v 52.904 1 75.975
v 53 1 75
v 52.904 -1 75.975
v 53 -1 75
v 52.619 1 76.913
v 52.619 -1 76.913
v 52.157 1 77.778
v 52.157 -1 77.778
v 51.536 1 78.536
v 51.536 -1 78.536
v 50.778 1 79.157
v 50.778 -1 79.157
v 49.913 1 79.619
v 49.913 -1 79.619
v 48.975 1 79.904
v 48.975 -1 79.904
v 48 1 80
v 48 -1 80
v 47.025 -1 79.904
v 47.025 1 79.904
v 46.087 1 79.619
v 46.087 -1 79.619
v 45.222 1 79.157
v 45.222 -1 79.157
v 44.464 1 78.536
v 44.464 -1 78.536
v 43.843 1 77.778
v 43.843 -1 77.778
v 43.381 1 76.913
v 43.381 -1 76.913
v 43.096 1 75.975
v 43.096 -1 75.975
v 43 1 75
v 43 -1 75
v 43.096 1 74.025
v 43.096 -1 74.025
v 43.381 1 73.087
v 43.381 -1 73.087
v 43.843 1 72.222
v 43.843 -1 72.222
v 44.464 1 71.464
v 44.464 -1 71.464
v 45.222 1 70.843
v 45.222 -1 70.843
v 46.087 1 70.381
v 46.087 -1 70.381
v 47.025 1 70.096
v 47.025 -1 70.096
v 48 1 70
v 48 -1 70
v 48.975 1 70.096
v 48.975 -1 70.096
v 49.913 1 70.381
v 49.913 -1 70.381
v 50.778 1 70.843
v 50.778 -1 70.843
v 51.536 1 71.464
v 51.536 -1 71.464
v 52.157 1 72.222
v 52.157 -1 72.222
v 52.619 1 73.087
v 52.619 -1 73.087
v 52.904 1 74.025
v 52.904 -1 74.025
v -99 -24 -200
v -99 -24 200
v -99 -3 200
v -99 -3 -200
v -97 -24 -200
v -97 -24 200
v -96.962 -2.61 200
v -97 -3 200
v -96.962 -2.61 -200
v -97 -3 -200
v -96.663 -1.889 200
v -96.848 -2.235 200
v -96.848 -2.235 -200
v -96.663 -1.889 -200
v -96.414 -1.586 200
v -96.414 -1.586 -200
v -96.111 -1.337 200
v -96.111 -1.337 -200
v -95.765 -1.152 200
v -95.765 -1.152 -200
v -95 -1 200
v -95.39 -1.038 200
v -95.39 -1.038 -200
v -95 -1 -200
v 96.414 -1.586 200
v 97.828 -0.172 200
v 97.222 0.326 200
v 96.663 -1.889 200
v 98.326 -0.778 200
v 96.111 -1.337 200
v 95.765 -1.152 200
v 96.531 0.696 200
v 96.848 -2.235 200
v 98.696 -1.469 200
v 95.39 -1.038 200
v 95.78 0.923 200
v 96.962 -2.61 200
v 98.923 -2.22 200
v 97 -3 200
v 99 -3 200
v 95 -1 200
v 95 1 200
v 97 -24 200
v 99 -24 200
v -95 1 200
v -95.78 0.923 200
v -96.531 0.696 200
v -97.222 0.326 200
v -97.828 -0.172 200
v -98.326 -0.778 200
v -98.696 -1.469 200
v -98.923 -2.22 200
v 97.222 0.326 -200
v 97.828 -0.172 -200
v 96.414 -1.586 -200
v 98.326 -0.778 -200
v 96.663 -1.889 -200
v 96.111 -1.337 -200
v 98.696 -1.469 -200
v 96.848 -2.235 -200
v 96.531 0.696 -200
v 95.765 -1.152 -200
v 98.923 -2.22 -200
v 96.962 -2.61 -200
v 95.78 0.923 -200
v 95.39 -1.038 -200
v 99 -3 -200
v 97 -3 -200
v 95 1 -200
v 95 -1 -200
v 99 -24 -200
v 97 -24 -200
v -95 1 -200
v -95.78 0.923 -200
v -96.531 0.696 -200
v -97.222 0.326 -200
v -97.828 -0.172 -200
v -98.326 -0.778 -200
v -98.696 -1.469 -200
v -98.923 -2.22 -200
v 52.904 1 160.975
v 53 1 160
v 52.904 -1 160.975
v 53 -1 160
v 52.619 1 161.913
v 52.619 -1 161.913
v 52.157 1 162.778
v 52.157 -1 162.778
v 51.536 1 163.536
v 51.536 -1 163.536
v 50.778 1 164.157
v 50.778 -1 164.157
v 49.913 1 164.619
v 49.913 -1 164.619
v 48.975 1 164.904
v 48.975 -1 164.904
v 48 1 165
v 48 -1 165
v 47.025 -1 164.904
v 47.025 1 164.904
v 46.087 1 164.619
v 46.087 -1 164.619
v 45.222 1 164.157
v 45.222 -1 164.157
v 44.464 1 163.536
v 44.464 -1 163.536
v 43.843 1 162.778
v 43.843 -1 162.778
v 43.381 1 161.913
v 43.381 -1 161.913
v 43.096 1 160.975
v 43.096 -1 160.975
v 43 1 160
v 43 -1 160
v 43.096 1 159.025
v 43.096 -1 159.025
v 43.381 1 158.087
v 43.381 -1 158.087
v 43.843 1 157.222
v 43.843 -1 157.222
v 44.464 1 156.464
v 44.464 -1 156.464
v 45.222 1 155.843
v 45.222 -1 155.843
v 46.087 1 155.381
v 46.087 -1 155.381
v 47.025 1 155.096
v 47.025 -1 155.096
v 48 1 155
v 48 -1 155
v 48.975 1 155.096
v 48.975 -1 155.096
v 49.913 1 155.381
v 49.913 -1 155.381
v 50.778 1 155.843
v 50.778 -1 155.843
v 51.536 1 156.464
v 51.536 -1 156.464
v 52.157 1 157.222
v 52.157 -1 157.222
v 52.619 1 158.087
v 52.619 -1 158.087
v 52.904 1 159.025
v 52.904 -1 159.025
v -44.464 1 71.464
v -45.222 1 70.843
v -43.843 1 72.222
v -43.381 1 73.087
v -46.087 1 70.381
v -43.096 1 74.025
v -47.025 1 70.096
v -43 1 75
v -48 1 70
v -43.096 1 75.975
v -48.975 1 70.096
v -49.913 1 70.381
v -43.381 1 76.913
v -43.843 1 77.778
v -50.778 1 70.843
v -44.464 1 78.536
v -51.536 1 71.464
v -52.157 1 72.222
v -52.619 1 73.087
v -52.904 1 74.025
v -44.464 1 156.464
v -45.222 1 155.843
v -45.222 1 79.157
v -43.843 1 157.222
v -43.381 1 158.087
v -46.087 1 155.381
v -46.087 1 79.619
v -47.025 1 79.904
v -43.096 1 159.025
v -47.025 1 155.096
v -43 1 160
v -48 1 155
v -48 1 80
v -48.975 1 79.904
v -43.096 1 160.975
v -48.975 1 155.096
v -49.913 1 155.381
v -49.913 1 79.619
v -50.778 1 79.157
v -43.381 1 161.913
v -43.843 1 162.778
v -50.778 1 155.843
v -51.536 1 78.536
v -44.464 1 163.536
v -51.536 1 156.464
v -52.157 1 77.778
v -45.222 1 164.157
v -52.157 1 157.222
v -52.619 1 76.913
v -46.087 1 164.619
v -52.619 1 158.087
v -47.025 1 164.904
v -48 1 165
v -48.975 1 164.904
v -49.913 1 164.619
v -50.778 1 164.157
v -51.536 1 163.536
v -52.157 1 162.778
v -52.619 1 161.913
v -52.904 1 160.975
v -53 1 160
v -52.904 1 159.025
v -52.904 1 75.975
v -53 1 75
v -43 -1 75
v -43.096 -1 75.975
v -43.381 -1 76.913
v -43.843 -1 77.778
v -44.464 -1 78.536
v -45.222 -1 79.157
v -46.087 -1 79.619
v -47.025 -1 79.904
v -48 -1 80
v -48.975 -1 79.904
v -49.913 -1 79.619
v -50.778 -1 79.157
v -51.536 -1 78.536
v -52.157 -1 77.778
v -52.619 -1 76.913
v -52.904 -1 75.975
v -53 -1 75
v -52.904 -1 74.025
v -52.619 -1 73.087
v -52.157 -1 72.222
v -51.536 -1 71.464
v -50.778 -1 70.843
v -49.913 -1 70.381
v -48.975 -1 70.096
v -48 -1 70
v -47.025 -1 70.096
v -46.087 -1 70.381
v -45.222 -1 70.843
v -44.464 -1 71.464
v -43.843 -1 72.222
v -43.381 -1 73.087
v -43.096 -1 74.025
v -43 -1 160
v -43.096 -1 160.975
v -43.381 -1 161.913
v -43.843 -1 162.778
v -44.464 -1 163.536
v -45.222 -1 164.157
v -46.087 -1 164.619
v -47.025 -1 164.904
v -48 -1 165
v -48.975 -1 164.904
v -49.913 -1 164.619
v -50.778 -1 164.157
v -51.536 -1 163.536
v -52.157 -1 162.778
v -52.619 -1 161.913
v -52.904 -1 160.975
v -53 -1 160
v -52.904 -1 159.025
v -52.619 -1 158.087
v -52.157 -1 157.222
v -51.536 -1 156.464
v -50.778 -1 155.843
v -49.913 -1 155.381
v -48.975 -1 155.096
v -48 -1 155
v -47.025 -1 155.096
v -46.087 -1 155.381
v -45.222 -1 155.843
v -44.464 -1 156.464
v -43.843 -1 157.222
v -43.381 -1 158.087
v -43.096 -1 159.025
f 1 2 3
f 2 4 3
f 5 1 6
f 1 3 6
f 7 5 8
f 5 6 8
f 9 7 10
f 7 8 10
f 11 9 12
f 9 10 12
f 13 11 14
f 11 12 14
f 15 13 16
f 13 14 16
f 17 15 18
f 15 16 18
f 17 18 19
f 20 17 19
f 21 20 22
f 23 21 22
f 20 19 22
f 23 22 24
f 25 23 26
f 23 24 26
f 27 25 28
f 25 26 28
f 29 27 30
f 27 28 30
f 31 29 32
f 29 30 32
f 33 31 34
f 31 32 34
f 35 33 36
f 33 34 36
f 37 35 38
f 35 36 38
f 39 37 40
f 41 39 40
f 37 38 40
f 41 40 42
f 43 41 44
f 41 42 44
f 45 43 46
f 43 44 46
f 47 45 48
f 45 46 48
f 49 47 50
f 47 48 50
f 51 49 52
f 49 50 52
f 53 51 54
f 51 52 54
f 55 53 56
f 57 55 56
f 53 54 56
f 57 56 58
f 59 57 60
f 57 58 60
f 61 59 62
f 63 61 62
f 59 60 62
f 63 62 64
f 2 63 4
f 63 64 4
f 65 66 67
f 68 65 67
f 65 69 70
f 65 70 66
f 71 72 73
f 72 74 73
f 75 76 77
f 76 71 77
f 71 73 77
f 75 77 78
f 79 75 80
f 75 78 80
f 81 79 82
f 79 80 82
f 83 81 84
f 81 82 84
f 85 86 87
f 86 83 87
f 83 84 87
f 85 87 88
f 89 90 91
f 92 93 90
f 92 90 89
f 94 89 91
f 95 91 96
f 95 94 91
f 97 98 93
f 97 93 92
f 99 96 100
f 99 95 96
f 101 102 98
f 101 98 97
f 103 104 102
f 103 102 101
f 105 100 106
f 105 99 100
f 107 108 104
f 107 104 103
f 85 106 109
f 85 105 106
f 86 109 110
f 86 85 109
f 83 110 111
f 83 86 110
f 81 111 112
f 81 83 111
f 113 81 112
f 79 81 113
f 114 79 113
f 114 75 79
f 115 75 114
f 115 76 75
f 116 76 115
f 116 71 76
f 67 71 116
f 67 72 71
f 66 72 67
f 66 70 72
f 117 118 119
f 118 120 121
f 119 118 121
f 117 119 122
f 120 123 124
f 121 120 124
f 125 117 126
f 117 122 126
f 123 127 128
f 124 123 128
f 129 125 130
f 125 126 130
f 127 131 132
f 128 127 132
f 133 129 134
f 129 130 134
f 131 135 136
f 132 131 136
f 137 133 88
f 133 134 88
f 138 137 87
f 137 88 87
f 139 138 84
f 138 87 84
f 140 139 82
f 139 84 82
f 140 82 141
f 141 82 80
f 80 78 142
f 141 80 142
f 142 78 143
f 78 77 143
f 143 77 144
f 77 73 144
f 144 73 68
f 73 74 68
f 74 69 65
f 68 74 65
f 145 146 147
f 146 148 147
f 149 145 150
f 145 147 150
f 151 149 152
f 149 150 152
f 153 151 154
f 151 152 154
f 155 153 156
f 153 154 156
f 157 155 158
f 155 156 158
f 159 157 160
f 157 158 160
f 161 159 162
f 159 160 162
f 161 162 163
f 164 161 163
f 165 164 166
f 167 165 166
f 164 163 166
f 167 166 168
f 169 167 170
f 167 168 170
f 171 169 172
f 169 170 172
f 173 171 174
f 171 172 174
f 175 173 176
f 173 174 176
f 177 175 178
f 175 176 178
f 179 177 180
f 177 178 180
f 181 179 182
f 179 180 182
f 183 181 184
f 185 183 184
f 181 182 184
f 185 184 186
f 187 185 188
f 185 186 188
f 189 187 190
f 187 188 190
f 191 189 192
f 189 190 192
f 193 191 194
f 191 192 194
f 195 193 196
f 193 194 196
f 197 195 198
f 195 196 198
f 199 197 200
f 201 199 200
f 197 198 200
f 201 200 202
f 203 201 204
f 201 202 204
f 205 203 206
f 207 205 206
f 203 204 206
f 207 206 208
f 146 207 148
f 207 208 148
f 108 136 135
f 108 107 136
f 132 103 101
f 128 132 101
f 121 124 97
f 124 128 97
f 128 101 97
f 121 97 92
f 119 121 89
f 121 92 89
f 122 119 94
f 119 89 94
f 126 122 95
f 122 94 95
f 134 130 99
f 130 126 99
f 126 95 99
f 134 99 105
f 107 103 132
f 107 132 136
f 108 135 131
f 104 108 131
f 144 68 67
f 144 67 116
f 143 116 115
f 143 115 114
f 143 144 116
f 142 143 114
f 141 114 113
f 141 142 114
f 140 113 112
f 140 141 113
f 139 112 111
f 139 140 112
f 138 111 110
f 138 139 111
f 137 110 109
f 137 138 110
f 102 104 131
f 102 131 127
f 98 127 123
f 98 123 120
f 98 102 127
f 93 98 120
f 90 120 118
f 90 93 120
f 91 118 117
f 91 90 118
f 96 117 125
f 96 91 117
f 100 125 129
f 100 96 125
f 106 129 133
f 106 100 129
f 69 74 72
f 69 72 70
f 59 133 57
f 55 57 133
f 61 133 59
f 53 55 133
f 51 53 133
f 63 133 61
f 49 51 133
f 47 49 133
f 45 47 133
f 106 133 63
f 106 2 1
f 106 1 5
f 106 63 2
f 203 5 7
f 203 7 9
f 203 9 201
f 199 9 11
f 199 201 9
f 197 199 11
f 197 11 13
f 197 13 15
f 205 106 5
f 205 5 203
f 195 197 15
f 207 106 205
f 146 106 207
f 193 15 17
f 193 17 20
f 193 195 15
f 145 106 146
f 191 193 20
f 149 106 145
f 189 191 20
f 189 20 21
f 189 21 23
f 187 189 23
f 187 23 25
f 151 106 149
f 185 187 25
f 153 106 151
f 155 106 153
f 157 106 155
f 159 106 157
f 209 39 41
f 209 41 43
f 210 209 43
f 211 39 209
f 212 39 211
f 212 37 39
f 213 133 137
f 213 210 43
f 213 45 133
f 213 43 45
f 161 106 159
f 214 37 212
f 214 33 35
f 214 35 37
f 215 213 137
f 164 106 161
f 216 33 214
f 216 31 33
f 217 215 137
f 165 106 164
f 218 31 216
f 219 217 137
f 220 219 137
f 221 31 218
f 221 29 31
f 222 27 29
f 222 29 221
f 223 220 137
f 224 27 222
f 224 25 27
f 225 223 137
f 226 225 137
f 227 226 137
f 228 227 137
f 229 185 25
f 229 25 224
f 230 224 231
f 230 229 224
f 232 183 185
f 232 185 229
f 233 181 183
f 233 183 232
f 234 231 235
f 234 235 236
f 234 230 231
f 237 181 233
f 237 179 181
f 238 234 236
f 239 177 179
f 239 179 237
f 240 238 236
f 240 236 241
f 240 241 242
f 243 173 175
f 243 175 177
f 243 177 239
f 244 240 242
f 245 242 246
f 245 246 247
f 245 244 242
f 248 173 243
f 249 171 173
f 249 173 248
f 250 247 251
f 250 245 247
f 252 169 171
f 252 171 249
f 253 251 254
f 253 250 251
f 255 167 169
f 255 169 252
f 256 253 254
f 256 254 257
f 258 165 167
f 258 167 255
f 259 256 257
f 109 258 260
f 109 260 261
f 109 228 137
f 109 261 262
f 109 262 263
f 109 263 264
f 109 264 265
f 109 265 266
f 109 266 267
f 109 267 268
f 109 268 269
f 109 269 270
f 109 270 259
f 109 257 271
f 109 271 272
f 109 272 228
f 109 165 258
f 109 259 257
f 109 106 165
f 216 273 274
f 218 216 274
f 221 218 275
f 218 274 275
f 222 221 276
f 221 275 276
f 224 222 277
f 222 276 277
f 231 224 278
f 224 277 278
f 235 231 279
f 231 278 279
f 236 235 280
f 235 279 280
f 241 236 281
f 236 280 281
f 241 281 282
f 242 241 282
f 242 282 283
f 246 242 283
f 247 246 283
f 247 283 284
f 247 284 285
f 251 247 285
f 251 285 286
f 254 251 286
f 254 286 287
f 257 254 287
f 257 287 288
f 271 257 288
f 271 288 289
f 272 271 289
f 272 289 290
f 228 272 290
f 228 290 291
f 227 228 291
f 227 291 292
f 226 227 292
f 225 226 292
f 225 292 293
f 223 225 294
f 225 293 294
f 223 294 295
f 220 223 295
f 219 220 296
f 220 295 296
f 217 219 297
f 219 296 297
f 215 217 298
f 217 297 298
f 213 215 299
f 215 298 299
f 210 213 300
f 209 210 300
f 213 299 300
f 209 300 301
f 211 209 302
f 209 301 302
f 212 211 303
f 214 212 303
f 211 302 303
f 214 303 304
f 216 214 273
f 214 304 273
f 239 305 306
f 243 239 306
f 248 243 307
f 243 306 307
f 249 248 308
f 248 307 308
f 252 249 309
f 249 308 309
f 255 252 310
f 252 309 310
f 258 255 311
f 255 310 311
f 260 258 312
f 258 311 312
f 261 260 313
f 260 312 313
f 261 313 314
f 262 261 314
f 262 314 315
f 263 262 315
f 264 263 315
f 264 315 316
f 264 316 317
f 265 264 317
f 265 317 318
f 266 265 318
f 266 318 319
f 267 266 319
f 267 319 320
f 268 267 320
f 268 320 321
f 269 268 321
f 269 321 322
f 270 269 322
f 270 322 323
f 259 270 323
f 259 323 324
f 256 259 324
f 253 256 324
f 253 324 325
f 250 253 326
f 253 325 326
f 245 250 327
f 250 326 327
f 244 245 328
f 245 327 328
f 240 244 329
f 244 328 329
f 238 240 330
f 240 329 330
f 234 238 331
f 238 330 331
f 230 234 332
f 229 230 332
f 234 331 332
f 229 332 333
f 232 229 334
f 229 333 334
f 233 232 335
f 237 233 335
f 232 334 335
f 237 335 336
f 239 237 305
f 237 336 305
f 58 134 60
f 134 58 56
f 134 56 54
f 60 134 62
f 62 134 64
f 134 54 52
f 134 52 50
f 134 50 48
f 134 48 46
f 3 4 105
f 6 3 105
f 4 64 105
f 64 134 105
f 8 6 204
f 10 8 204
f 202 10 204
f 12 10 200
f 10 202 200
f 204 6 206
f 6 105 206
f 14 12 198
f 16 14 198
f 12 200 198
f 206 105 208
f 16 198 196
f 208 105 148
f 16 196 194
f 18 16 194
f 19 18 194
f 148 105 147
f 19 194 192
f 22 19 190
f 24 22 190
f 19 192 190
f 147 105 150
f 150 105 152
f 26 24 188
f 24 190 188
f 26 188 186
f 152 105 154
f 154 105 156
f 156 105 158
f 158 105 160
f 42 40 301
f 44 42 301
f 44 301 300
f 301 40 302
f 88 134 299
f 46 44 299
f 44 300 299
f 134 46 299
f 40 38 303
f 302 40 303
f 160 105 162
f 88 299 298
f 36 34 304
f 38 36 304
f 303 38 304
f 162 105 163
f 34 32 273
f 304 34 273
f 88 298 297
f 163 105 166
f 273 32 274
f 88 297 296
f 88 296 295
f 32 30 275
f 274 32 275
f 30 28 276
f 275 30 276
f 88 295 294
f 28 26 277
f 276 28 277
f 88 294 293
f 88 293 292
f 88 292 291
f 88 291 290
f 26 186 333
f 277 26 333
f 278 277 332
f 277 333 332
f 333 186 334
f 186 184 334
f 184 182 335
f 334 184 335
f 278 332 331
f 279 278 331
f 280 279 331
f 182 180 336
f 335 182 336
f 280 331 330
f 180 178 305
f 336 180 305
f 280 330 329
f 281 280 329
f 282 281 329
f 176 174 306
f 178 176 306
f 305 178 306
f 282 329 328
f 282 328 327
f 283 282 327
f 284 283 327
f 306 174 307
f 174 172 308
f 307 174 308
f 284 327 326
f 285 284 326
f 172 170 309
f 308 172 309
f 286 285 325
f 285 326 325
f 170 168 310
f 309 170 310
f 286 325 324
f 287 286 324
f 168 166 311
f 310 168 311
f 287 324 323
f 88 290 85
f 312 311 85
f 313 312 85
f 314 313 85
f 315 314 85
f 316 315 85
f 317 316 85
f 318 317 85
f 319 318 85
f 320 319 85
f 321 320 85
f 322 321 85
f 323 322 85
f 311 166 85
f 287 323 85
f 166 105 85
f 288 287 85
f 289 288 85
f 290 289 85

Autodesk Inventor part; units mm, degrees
ref_plane "YZ Plane" through (0, 0, 0) normal (1, 0, 0) x (0, 1, 0)
ref_plane "XZ Plane" through (0, 0, 0) normal (0, 1, 0) x (-1, 0, 0)
ref_plane "XY Plane" through (0, 0, 0) normal (0, 0, 1) x (1, 0, 0)
sketch "Sketch4" plane through (0, 0, 0) normal (0, 1, 0) x (-1, 0, 0)
  line L0 (99, -200) -> (-99, -200)
  line L1 (-99, -200) -> (-99, 200)
  line L2 (-99, 200) -> (99, 200)
  line L3 (99, 200) -> (99, -200)
  line L4 (99, -200) -> (-99, 200) construction
  point P0 (0, 0)
  point P1 (0, 0)
  dimension "d24" = 198
  dimension "d25" = 400
extrude "Plate4" add sketch "Sketch4" along normal mid plane 2
sketch "Sketch7" plane through (0, -1, 0) normal (0, -1, 0) x (1, 0, 0)
  circle A0 centre (48, 75) radius 5
  line L0 (99, 200) -> (99, -200) projected
  line L1 (99, -200) -> (-99, -200) projected
  line L2 (0, -200) -> (0, 200) construction
  line L3 (99, 0) -> (-99, 0) construction
  circle A1 centre (-48, 75) radius 5
  circle A2 centre (48, 160) radius 5
  circle A3 centre (-48, 160) radius 5
  line L4 (99, 200) -> (-99, 200) projected
  point P0 (0, 0)
  point P1 (0, 0)
  dimension "d41" = 10
  dimension "d46" = 85
  dimension "d57" = 96
  dimension "d70" = 125
extrude "Extrusion2" cut sketch "Sketch7" against normal up to surface (2 mm away)
sketch "Sketch9" plane through (97, 1, -200) normal (1, 0, 0) x (0, -1, 0)
  line L0 (0, 400) -> (0, 0)
  line L1 (0, 0) -> (25, 0)
  line L2 (25, 0) -> (25, 400)
  line L3 (25, 400) -> (0, 400)
edge flange "Flange5" height 25 angle 90 thickness 2 bend radius 2 thickness toward (1, 0, 0) relief tear relief width 2 relief depth 1 corner gap 2 corner form 0 edges at (99, 1, 0) (-99, 1, 0) wall of the first edge with corners at (97, 1, 200) (97, 1, -200) (97, -24, -200) (97, -24, 200)
bend "Bend5"
corner "Corner5"
equation "\"d24\" = Ширина_базовой_пластины"
equation "\"d25\" = Длина_базовой_пластины"
equation "\"d26\" = Thickness"
equation "\"d60\" = BendReliefWidth"
equation "\"d61\" = BendReliefDepth"
equation "\"d62\" = MinimumRemnant"
equation "\"d63\" = TransitionRadius"
equation "\"d66\" = BendRadius"
equation "\"d67\" = CornerReliefSize"
equation "\"d68\" = GapSize"
equation "\"d69\" = JacobiRadiusSize"
equation "\"BendRadius\" = Thickness"
equation "\"BendReliefWidth\" = Thickness"
equation "\"BendReliefDepth\" = 0.5 * Thickness"
equation "\"CornerReliefSize\" = 4 * Thickness"
equation "\"MinimumRemnant\" = 2 * Thickness"
equation "\"TransitionRadius\" = BendRadius"
equation "\"JacobiRadiusSize\" = BendRadius"
equation "\"GapSize\" = Thickness"
equation "\"Ширина_базовой_пластины\" = 198"
equation "\"Длина_базовой_пластины\" = 400"
equation "\"Thickness\" = 2"
properties part number "Крепление"
